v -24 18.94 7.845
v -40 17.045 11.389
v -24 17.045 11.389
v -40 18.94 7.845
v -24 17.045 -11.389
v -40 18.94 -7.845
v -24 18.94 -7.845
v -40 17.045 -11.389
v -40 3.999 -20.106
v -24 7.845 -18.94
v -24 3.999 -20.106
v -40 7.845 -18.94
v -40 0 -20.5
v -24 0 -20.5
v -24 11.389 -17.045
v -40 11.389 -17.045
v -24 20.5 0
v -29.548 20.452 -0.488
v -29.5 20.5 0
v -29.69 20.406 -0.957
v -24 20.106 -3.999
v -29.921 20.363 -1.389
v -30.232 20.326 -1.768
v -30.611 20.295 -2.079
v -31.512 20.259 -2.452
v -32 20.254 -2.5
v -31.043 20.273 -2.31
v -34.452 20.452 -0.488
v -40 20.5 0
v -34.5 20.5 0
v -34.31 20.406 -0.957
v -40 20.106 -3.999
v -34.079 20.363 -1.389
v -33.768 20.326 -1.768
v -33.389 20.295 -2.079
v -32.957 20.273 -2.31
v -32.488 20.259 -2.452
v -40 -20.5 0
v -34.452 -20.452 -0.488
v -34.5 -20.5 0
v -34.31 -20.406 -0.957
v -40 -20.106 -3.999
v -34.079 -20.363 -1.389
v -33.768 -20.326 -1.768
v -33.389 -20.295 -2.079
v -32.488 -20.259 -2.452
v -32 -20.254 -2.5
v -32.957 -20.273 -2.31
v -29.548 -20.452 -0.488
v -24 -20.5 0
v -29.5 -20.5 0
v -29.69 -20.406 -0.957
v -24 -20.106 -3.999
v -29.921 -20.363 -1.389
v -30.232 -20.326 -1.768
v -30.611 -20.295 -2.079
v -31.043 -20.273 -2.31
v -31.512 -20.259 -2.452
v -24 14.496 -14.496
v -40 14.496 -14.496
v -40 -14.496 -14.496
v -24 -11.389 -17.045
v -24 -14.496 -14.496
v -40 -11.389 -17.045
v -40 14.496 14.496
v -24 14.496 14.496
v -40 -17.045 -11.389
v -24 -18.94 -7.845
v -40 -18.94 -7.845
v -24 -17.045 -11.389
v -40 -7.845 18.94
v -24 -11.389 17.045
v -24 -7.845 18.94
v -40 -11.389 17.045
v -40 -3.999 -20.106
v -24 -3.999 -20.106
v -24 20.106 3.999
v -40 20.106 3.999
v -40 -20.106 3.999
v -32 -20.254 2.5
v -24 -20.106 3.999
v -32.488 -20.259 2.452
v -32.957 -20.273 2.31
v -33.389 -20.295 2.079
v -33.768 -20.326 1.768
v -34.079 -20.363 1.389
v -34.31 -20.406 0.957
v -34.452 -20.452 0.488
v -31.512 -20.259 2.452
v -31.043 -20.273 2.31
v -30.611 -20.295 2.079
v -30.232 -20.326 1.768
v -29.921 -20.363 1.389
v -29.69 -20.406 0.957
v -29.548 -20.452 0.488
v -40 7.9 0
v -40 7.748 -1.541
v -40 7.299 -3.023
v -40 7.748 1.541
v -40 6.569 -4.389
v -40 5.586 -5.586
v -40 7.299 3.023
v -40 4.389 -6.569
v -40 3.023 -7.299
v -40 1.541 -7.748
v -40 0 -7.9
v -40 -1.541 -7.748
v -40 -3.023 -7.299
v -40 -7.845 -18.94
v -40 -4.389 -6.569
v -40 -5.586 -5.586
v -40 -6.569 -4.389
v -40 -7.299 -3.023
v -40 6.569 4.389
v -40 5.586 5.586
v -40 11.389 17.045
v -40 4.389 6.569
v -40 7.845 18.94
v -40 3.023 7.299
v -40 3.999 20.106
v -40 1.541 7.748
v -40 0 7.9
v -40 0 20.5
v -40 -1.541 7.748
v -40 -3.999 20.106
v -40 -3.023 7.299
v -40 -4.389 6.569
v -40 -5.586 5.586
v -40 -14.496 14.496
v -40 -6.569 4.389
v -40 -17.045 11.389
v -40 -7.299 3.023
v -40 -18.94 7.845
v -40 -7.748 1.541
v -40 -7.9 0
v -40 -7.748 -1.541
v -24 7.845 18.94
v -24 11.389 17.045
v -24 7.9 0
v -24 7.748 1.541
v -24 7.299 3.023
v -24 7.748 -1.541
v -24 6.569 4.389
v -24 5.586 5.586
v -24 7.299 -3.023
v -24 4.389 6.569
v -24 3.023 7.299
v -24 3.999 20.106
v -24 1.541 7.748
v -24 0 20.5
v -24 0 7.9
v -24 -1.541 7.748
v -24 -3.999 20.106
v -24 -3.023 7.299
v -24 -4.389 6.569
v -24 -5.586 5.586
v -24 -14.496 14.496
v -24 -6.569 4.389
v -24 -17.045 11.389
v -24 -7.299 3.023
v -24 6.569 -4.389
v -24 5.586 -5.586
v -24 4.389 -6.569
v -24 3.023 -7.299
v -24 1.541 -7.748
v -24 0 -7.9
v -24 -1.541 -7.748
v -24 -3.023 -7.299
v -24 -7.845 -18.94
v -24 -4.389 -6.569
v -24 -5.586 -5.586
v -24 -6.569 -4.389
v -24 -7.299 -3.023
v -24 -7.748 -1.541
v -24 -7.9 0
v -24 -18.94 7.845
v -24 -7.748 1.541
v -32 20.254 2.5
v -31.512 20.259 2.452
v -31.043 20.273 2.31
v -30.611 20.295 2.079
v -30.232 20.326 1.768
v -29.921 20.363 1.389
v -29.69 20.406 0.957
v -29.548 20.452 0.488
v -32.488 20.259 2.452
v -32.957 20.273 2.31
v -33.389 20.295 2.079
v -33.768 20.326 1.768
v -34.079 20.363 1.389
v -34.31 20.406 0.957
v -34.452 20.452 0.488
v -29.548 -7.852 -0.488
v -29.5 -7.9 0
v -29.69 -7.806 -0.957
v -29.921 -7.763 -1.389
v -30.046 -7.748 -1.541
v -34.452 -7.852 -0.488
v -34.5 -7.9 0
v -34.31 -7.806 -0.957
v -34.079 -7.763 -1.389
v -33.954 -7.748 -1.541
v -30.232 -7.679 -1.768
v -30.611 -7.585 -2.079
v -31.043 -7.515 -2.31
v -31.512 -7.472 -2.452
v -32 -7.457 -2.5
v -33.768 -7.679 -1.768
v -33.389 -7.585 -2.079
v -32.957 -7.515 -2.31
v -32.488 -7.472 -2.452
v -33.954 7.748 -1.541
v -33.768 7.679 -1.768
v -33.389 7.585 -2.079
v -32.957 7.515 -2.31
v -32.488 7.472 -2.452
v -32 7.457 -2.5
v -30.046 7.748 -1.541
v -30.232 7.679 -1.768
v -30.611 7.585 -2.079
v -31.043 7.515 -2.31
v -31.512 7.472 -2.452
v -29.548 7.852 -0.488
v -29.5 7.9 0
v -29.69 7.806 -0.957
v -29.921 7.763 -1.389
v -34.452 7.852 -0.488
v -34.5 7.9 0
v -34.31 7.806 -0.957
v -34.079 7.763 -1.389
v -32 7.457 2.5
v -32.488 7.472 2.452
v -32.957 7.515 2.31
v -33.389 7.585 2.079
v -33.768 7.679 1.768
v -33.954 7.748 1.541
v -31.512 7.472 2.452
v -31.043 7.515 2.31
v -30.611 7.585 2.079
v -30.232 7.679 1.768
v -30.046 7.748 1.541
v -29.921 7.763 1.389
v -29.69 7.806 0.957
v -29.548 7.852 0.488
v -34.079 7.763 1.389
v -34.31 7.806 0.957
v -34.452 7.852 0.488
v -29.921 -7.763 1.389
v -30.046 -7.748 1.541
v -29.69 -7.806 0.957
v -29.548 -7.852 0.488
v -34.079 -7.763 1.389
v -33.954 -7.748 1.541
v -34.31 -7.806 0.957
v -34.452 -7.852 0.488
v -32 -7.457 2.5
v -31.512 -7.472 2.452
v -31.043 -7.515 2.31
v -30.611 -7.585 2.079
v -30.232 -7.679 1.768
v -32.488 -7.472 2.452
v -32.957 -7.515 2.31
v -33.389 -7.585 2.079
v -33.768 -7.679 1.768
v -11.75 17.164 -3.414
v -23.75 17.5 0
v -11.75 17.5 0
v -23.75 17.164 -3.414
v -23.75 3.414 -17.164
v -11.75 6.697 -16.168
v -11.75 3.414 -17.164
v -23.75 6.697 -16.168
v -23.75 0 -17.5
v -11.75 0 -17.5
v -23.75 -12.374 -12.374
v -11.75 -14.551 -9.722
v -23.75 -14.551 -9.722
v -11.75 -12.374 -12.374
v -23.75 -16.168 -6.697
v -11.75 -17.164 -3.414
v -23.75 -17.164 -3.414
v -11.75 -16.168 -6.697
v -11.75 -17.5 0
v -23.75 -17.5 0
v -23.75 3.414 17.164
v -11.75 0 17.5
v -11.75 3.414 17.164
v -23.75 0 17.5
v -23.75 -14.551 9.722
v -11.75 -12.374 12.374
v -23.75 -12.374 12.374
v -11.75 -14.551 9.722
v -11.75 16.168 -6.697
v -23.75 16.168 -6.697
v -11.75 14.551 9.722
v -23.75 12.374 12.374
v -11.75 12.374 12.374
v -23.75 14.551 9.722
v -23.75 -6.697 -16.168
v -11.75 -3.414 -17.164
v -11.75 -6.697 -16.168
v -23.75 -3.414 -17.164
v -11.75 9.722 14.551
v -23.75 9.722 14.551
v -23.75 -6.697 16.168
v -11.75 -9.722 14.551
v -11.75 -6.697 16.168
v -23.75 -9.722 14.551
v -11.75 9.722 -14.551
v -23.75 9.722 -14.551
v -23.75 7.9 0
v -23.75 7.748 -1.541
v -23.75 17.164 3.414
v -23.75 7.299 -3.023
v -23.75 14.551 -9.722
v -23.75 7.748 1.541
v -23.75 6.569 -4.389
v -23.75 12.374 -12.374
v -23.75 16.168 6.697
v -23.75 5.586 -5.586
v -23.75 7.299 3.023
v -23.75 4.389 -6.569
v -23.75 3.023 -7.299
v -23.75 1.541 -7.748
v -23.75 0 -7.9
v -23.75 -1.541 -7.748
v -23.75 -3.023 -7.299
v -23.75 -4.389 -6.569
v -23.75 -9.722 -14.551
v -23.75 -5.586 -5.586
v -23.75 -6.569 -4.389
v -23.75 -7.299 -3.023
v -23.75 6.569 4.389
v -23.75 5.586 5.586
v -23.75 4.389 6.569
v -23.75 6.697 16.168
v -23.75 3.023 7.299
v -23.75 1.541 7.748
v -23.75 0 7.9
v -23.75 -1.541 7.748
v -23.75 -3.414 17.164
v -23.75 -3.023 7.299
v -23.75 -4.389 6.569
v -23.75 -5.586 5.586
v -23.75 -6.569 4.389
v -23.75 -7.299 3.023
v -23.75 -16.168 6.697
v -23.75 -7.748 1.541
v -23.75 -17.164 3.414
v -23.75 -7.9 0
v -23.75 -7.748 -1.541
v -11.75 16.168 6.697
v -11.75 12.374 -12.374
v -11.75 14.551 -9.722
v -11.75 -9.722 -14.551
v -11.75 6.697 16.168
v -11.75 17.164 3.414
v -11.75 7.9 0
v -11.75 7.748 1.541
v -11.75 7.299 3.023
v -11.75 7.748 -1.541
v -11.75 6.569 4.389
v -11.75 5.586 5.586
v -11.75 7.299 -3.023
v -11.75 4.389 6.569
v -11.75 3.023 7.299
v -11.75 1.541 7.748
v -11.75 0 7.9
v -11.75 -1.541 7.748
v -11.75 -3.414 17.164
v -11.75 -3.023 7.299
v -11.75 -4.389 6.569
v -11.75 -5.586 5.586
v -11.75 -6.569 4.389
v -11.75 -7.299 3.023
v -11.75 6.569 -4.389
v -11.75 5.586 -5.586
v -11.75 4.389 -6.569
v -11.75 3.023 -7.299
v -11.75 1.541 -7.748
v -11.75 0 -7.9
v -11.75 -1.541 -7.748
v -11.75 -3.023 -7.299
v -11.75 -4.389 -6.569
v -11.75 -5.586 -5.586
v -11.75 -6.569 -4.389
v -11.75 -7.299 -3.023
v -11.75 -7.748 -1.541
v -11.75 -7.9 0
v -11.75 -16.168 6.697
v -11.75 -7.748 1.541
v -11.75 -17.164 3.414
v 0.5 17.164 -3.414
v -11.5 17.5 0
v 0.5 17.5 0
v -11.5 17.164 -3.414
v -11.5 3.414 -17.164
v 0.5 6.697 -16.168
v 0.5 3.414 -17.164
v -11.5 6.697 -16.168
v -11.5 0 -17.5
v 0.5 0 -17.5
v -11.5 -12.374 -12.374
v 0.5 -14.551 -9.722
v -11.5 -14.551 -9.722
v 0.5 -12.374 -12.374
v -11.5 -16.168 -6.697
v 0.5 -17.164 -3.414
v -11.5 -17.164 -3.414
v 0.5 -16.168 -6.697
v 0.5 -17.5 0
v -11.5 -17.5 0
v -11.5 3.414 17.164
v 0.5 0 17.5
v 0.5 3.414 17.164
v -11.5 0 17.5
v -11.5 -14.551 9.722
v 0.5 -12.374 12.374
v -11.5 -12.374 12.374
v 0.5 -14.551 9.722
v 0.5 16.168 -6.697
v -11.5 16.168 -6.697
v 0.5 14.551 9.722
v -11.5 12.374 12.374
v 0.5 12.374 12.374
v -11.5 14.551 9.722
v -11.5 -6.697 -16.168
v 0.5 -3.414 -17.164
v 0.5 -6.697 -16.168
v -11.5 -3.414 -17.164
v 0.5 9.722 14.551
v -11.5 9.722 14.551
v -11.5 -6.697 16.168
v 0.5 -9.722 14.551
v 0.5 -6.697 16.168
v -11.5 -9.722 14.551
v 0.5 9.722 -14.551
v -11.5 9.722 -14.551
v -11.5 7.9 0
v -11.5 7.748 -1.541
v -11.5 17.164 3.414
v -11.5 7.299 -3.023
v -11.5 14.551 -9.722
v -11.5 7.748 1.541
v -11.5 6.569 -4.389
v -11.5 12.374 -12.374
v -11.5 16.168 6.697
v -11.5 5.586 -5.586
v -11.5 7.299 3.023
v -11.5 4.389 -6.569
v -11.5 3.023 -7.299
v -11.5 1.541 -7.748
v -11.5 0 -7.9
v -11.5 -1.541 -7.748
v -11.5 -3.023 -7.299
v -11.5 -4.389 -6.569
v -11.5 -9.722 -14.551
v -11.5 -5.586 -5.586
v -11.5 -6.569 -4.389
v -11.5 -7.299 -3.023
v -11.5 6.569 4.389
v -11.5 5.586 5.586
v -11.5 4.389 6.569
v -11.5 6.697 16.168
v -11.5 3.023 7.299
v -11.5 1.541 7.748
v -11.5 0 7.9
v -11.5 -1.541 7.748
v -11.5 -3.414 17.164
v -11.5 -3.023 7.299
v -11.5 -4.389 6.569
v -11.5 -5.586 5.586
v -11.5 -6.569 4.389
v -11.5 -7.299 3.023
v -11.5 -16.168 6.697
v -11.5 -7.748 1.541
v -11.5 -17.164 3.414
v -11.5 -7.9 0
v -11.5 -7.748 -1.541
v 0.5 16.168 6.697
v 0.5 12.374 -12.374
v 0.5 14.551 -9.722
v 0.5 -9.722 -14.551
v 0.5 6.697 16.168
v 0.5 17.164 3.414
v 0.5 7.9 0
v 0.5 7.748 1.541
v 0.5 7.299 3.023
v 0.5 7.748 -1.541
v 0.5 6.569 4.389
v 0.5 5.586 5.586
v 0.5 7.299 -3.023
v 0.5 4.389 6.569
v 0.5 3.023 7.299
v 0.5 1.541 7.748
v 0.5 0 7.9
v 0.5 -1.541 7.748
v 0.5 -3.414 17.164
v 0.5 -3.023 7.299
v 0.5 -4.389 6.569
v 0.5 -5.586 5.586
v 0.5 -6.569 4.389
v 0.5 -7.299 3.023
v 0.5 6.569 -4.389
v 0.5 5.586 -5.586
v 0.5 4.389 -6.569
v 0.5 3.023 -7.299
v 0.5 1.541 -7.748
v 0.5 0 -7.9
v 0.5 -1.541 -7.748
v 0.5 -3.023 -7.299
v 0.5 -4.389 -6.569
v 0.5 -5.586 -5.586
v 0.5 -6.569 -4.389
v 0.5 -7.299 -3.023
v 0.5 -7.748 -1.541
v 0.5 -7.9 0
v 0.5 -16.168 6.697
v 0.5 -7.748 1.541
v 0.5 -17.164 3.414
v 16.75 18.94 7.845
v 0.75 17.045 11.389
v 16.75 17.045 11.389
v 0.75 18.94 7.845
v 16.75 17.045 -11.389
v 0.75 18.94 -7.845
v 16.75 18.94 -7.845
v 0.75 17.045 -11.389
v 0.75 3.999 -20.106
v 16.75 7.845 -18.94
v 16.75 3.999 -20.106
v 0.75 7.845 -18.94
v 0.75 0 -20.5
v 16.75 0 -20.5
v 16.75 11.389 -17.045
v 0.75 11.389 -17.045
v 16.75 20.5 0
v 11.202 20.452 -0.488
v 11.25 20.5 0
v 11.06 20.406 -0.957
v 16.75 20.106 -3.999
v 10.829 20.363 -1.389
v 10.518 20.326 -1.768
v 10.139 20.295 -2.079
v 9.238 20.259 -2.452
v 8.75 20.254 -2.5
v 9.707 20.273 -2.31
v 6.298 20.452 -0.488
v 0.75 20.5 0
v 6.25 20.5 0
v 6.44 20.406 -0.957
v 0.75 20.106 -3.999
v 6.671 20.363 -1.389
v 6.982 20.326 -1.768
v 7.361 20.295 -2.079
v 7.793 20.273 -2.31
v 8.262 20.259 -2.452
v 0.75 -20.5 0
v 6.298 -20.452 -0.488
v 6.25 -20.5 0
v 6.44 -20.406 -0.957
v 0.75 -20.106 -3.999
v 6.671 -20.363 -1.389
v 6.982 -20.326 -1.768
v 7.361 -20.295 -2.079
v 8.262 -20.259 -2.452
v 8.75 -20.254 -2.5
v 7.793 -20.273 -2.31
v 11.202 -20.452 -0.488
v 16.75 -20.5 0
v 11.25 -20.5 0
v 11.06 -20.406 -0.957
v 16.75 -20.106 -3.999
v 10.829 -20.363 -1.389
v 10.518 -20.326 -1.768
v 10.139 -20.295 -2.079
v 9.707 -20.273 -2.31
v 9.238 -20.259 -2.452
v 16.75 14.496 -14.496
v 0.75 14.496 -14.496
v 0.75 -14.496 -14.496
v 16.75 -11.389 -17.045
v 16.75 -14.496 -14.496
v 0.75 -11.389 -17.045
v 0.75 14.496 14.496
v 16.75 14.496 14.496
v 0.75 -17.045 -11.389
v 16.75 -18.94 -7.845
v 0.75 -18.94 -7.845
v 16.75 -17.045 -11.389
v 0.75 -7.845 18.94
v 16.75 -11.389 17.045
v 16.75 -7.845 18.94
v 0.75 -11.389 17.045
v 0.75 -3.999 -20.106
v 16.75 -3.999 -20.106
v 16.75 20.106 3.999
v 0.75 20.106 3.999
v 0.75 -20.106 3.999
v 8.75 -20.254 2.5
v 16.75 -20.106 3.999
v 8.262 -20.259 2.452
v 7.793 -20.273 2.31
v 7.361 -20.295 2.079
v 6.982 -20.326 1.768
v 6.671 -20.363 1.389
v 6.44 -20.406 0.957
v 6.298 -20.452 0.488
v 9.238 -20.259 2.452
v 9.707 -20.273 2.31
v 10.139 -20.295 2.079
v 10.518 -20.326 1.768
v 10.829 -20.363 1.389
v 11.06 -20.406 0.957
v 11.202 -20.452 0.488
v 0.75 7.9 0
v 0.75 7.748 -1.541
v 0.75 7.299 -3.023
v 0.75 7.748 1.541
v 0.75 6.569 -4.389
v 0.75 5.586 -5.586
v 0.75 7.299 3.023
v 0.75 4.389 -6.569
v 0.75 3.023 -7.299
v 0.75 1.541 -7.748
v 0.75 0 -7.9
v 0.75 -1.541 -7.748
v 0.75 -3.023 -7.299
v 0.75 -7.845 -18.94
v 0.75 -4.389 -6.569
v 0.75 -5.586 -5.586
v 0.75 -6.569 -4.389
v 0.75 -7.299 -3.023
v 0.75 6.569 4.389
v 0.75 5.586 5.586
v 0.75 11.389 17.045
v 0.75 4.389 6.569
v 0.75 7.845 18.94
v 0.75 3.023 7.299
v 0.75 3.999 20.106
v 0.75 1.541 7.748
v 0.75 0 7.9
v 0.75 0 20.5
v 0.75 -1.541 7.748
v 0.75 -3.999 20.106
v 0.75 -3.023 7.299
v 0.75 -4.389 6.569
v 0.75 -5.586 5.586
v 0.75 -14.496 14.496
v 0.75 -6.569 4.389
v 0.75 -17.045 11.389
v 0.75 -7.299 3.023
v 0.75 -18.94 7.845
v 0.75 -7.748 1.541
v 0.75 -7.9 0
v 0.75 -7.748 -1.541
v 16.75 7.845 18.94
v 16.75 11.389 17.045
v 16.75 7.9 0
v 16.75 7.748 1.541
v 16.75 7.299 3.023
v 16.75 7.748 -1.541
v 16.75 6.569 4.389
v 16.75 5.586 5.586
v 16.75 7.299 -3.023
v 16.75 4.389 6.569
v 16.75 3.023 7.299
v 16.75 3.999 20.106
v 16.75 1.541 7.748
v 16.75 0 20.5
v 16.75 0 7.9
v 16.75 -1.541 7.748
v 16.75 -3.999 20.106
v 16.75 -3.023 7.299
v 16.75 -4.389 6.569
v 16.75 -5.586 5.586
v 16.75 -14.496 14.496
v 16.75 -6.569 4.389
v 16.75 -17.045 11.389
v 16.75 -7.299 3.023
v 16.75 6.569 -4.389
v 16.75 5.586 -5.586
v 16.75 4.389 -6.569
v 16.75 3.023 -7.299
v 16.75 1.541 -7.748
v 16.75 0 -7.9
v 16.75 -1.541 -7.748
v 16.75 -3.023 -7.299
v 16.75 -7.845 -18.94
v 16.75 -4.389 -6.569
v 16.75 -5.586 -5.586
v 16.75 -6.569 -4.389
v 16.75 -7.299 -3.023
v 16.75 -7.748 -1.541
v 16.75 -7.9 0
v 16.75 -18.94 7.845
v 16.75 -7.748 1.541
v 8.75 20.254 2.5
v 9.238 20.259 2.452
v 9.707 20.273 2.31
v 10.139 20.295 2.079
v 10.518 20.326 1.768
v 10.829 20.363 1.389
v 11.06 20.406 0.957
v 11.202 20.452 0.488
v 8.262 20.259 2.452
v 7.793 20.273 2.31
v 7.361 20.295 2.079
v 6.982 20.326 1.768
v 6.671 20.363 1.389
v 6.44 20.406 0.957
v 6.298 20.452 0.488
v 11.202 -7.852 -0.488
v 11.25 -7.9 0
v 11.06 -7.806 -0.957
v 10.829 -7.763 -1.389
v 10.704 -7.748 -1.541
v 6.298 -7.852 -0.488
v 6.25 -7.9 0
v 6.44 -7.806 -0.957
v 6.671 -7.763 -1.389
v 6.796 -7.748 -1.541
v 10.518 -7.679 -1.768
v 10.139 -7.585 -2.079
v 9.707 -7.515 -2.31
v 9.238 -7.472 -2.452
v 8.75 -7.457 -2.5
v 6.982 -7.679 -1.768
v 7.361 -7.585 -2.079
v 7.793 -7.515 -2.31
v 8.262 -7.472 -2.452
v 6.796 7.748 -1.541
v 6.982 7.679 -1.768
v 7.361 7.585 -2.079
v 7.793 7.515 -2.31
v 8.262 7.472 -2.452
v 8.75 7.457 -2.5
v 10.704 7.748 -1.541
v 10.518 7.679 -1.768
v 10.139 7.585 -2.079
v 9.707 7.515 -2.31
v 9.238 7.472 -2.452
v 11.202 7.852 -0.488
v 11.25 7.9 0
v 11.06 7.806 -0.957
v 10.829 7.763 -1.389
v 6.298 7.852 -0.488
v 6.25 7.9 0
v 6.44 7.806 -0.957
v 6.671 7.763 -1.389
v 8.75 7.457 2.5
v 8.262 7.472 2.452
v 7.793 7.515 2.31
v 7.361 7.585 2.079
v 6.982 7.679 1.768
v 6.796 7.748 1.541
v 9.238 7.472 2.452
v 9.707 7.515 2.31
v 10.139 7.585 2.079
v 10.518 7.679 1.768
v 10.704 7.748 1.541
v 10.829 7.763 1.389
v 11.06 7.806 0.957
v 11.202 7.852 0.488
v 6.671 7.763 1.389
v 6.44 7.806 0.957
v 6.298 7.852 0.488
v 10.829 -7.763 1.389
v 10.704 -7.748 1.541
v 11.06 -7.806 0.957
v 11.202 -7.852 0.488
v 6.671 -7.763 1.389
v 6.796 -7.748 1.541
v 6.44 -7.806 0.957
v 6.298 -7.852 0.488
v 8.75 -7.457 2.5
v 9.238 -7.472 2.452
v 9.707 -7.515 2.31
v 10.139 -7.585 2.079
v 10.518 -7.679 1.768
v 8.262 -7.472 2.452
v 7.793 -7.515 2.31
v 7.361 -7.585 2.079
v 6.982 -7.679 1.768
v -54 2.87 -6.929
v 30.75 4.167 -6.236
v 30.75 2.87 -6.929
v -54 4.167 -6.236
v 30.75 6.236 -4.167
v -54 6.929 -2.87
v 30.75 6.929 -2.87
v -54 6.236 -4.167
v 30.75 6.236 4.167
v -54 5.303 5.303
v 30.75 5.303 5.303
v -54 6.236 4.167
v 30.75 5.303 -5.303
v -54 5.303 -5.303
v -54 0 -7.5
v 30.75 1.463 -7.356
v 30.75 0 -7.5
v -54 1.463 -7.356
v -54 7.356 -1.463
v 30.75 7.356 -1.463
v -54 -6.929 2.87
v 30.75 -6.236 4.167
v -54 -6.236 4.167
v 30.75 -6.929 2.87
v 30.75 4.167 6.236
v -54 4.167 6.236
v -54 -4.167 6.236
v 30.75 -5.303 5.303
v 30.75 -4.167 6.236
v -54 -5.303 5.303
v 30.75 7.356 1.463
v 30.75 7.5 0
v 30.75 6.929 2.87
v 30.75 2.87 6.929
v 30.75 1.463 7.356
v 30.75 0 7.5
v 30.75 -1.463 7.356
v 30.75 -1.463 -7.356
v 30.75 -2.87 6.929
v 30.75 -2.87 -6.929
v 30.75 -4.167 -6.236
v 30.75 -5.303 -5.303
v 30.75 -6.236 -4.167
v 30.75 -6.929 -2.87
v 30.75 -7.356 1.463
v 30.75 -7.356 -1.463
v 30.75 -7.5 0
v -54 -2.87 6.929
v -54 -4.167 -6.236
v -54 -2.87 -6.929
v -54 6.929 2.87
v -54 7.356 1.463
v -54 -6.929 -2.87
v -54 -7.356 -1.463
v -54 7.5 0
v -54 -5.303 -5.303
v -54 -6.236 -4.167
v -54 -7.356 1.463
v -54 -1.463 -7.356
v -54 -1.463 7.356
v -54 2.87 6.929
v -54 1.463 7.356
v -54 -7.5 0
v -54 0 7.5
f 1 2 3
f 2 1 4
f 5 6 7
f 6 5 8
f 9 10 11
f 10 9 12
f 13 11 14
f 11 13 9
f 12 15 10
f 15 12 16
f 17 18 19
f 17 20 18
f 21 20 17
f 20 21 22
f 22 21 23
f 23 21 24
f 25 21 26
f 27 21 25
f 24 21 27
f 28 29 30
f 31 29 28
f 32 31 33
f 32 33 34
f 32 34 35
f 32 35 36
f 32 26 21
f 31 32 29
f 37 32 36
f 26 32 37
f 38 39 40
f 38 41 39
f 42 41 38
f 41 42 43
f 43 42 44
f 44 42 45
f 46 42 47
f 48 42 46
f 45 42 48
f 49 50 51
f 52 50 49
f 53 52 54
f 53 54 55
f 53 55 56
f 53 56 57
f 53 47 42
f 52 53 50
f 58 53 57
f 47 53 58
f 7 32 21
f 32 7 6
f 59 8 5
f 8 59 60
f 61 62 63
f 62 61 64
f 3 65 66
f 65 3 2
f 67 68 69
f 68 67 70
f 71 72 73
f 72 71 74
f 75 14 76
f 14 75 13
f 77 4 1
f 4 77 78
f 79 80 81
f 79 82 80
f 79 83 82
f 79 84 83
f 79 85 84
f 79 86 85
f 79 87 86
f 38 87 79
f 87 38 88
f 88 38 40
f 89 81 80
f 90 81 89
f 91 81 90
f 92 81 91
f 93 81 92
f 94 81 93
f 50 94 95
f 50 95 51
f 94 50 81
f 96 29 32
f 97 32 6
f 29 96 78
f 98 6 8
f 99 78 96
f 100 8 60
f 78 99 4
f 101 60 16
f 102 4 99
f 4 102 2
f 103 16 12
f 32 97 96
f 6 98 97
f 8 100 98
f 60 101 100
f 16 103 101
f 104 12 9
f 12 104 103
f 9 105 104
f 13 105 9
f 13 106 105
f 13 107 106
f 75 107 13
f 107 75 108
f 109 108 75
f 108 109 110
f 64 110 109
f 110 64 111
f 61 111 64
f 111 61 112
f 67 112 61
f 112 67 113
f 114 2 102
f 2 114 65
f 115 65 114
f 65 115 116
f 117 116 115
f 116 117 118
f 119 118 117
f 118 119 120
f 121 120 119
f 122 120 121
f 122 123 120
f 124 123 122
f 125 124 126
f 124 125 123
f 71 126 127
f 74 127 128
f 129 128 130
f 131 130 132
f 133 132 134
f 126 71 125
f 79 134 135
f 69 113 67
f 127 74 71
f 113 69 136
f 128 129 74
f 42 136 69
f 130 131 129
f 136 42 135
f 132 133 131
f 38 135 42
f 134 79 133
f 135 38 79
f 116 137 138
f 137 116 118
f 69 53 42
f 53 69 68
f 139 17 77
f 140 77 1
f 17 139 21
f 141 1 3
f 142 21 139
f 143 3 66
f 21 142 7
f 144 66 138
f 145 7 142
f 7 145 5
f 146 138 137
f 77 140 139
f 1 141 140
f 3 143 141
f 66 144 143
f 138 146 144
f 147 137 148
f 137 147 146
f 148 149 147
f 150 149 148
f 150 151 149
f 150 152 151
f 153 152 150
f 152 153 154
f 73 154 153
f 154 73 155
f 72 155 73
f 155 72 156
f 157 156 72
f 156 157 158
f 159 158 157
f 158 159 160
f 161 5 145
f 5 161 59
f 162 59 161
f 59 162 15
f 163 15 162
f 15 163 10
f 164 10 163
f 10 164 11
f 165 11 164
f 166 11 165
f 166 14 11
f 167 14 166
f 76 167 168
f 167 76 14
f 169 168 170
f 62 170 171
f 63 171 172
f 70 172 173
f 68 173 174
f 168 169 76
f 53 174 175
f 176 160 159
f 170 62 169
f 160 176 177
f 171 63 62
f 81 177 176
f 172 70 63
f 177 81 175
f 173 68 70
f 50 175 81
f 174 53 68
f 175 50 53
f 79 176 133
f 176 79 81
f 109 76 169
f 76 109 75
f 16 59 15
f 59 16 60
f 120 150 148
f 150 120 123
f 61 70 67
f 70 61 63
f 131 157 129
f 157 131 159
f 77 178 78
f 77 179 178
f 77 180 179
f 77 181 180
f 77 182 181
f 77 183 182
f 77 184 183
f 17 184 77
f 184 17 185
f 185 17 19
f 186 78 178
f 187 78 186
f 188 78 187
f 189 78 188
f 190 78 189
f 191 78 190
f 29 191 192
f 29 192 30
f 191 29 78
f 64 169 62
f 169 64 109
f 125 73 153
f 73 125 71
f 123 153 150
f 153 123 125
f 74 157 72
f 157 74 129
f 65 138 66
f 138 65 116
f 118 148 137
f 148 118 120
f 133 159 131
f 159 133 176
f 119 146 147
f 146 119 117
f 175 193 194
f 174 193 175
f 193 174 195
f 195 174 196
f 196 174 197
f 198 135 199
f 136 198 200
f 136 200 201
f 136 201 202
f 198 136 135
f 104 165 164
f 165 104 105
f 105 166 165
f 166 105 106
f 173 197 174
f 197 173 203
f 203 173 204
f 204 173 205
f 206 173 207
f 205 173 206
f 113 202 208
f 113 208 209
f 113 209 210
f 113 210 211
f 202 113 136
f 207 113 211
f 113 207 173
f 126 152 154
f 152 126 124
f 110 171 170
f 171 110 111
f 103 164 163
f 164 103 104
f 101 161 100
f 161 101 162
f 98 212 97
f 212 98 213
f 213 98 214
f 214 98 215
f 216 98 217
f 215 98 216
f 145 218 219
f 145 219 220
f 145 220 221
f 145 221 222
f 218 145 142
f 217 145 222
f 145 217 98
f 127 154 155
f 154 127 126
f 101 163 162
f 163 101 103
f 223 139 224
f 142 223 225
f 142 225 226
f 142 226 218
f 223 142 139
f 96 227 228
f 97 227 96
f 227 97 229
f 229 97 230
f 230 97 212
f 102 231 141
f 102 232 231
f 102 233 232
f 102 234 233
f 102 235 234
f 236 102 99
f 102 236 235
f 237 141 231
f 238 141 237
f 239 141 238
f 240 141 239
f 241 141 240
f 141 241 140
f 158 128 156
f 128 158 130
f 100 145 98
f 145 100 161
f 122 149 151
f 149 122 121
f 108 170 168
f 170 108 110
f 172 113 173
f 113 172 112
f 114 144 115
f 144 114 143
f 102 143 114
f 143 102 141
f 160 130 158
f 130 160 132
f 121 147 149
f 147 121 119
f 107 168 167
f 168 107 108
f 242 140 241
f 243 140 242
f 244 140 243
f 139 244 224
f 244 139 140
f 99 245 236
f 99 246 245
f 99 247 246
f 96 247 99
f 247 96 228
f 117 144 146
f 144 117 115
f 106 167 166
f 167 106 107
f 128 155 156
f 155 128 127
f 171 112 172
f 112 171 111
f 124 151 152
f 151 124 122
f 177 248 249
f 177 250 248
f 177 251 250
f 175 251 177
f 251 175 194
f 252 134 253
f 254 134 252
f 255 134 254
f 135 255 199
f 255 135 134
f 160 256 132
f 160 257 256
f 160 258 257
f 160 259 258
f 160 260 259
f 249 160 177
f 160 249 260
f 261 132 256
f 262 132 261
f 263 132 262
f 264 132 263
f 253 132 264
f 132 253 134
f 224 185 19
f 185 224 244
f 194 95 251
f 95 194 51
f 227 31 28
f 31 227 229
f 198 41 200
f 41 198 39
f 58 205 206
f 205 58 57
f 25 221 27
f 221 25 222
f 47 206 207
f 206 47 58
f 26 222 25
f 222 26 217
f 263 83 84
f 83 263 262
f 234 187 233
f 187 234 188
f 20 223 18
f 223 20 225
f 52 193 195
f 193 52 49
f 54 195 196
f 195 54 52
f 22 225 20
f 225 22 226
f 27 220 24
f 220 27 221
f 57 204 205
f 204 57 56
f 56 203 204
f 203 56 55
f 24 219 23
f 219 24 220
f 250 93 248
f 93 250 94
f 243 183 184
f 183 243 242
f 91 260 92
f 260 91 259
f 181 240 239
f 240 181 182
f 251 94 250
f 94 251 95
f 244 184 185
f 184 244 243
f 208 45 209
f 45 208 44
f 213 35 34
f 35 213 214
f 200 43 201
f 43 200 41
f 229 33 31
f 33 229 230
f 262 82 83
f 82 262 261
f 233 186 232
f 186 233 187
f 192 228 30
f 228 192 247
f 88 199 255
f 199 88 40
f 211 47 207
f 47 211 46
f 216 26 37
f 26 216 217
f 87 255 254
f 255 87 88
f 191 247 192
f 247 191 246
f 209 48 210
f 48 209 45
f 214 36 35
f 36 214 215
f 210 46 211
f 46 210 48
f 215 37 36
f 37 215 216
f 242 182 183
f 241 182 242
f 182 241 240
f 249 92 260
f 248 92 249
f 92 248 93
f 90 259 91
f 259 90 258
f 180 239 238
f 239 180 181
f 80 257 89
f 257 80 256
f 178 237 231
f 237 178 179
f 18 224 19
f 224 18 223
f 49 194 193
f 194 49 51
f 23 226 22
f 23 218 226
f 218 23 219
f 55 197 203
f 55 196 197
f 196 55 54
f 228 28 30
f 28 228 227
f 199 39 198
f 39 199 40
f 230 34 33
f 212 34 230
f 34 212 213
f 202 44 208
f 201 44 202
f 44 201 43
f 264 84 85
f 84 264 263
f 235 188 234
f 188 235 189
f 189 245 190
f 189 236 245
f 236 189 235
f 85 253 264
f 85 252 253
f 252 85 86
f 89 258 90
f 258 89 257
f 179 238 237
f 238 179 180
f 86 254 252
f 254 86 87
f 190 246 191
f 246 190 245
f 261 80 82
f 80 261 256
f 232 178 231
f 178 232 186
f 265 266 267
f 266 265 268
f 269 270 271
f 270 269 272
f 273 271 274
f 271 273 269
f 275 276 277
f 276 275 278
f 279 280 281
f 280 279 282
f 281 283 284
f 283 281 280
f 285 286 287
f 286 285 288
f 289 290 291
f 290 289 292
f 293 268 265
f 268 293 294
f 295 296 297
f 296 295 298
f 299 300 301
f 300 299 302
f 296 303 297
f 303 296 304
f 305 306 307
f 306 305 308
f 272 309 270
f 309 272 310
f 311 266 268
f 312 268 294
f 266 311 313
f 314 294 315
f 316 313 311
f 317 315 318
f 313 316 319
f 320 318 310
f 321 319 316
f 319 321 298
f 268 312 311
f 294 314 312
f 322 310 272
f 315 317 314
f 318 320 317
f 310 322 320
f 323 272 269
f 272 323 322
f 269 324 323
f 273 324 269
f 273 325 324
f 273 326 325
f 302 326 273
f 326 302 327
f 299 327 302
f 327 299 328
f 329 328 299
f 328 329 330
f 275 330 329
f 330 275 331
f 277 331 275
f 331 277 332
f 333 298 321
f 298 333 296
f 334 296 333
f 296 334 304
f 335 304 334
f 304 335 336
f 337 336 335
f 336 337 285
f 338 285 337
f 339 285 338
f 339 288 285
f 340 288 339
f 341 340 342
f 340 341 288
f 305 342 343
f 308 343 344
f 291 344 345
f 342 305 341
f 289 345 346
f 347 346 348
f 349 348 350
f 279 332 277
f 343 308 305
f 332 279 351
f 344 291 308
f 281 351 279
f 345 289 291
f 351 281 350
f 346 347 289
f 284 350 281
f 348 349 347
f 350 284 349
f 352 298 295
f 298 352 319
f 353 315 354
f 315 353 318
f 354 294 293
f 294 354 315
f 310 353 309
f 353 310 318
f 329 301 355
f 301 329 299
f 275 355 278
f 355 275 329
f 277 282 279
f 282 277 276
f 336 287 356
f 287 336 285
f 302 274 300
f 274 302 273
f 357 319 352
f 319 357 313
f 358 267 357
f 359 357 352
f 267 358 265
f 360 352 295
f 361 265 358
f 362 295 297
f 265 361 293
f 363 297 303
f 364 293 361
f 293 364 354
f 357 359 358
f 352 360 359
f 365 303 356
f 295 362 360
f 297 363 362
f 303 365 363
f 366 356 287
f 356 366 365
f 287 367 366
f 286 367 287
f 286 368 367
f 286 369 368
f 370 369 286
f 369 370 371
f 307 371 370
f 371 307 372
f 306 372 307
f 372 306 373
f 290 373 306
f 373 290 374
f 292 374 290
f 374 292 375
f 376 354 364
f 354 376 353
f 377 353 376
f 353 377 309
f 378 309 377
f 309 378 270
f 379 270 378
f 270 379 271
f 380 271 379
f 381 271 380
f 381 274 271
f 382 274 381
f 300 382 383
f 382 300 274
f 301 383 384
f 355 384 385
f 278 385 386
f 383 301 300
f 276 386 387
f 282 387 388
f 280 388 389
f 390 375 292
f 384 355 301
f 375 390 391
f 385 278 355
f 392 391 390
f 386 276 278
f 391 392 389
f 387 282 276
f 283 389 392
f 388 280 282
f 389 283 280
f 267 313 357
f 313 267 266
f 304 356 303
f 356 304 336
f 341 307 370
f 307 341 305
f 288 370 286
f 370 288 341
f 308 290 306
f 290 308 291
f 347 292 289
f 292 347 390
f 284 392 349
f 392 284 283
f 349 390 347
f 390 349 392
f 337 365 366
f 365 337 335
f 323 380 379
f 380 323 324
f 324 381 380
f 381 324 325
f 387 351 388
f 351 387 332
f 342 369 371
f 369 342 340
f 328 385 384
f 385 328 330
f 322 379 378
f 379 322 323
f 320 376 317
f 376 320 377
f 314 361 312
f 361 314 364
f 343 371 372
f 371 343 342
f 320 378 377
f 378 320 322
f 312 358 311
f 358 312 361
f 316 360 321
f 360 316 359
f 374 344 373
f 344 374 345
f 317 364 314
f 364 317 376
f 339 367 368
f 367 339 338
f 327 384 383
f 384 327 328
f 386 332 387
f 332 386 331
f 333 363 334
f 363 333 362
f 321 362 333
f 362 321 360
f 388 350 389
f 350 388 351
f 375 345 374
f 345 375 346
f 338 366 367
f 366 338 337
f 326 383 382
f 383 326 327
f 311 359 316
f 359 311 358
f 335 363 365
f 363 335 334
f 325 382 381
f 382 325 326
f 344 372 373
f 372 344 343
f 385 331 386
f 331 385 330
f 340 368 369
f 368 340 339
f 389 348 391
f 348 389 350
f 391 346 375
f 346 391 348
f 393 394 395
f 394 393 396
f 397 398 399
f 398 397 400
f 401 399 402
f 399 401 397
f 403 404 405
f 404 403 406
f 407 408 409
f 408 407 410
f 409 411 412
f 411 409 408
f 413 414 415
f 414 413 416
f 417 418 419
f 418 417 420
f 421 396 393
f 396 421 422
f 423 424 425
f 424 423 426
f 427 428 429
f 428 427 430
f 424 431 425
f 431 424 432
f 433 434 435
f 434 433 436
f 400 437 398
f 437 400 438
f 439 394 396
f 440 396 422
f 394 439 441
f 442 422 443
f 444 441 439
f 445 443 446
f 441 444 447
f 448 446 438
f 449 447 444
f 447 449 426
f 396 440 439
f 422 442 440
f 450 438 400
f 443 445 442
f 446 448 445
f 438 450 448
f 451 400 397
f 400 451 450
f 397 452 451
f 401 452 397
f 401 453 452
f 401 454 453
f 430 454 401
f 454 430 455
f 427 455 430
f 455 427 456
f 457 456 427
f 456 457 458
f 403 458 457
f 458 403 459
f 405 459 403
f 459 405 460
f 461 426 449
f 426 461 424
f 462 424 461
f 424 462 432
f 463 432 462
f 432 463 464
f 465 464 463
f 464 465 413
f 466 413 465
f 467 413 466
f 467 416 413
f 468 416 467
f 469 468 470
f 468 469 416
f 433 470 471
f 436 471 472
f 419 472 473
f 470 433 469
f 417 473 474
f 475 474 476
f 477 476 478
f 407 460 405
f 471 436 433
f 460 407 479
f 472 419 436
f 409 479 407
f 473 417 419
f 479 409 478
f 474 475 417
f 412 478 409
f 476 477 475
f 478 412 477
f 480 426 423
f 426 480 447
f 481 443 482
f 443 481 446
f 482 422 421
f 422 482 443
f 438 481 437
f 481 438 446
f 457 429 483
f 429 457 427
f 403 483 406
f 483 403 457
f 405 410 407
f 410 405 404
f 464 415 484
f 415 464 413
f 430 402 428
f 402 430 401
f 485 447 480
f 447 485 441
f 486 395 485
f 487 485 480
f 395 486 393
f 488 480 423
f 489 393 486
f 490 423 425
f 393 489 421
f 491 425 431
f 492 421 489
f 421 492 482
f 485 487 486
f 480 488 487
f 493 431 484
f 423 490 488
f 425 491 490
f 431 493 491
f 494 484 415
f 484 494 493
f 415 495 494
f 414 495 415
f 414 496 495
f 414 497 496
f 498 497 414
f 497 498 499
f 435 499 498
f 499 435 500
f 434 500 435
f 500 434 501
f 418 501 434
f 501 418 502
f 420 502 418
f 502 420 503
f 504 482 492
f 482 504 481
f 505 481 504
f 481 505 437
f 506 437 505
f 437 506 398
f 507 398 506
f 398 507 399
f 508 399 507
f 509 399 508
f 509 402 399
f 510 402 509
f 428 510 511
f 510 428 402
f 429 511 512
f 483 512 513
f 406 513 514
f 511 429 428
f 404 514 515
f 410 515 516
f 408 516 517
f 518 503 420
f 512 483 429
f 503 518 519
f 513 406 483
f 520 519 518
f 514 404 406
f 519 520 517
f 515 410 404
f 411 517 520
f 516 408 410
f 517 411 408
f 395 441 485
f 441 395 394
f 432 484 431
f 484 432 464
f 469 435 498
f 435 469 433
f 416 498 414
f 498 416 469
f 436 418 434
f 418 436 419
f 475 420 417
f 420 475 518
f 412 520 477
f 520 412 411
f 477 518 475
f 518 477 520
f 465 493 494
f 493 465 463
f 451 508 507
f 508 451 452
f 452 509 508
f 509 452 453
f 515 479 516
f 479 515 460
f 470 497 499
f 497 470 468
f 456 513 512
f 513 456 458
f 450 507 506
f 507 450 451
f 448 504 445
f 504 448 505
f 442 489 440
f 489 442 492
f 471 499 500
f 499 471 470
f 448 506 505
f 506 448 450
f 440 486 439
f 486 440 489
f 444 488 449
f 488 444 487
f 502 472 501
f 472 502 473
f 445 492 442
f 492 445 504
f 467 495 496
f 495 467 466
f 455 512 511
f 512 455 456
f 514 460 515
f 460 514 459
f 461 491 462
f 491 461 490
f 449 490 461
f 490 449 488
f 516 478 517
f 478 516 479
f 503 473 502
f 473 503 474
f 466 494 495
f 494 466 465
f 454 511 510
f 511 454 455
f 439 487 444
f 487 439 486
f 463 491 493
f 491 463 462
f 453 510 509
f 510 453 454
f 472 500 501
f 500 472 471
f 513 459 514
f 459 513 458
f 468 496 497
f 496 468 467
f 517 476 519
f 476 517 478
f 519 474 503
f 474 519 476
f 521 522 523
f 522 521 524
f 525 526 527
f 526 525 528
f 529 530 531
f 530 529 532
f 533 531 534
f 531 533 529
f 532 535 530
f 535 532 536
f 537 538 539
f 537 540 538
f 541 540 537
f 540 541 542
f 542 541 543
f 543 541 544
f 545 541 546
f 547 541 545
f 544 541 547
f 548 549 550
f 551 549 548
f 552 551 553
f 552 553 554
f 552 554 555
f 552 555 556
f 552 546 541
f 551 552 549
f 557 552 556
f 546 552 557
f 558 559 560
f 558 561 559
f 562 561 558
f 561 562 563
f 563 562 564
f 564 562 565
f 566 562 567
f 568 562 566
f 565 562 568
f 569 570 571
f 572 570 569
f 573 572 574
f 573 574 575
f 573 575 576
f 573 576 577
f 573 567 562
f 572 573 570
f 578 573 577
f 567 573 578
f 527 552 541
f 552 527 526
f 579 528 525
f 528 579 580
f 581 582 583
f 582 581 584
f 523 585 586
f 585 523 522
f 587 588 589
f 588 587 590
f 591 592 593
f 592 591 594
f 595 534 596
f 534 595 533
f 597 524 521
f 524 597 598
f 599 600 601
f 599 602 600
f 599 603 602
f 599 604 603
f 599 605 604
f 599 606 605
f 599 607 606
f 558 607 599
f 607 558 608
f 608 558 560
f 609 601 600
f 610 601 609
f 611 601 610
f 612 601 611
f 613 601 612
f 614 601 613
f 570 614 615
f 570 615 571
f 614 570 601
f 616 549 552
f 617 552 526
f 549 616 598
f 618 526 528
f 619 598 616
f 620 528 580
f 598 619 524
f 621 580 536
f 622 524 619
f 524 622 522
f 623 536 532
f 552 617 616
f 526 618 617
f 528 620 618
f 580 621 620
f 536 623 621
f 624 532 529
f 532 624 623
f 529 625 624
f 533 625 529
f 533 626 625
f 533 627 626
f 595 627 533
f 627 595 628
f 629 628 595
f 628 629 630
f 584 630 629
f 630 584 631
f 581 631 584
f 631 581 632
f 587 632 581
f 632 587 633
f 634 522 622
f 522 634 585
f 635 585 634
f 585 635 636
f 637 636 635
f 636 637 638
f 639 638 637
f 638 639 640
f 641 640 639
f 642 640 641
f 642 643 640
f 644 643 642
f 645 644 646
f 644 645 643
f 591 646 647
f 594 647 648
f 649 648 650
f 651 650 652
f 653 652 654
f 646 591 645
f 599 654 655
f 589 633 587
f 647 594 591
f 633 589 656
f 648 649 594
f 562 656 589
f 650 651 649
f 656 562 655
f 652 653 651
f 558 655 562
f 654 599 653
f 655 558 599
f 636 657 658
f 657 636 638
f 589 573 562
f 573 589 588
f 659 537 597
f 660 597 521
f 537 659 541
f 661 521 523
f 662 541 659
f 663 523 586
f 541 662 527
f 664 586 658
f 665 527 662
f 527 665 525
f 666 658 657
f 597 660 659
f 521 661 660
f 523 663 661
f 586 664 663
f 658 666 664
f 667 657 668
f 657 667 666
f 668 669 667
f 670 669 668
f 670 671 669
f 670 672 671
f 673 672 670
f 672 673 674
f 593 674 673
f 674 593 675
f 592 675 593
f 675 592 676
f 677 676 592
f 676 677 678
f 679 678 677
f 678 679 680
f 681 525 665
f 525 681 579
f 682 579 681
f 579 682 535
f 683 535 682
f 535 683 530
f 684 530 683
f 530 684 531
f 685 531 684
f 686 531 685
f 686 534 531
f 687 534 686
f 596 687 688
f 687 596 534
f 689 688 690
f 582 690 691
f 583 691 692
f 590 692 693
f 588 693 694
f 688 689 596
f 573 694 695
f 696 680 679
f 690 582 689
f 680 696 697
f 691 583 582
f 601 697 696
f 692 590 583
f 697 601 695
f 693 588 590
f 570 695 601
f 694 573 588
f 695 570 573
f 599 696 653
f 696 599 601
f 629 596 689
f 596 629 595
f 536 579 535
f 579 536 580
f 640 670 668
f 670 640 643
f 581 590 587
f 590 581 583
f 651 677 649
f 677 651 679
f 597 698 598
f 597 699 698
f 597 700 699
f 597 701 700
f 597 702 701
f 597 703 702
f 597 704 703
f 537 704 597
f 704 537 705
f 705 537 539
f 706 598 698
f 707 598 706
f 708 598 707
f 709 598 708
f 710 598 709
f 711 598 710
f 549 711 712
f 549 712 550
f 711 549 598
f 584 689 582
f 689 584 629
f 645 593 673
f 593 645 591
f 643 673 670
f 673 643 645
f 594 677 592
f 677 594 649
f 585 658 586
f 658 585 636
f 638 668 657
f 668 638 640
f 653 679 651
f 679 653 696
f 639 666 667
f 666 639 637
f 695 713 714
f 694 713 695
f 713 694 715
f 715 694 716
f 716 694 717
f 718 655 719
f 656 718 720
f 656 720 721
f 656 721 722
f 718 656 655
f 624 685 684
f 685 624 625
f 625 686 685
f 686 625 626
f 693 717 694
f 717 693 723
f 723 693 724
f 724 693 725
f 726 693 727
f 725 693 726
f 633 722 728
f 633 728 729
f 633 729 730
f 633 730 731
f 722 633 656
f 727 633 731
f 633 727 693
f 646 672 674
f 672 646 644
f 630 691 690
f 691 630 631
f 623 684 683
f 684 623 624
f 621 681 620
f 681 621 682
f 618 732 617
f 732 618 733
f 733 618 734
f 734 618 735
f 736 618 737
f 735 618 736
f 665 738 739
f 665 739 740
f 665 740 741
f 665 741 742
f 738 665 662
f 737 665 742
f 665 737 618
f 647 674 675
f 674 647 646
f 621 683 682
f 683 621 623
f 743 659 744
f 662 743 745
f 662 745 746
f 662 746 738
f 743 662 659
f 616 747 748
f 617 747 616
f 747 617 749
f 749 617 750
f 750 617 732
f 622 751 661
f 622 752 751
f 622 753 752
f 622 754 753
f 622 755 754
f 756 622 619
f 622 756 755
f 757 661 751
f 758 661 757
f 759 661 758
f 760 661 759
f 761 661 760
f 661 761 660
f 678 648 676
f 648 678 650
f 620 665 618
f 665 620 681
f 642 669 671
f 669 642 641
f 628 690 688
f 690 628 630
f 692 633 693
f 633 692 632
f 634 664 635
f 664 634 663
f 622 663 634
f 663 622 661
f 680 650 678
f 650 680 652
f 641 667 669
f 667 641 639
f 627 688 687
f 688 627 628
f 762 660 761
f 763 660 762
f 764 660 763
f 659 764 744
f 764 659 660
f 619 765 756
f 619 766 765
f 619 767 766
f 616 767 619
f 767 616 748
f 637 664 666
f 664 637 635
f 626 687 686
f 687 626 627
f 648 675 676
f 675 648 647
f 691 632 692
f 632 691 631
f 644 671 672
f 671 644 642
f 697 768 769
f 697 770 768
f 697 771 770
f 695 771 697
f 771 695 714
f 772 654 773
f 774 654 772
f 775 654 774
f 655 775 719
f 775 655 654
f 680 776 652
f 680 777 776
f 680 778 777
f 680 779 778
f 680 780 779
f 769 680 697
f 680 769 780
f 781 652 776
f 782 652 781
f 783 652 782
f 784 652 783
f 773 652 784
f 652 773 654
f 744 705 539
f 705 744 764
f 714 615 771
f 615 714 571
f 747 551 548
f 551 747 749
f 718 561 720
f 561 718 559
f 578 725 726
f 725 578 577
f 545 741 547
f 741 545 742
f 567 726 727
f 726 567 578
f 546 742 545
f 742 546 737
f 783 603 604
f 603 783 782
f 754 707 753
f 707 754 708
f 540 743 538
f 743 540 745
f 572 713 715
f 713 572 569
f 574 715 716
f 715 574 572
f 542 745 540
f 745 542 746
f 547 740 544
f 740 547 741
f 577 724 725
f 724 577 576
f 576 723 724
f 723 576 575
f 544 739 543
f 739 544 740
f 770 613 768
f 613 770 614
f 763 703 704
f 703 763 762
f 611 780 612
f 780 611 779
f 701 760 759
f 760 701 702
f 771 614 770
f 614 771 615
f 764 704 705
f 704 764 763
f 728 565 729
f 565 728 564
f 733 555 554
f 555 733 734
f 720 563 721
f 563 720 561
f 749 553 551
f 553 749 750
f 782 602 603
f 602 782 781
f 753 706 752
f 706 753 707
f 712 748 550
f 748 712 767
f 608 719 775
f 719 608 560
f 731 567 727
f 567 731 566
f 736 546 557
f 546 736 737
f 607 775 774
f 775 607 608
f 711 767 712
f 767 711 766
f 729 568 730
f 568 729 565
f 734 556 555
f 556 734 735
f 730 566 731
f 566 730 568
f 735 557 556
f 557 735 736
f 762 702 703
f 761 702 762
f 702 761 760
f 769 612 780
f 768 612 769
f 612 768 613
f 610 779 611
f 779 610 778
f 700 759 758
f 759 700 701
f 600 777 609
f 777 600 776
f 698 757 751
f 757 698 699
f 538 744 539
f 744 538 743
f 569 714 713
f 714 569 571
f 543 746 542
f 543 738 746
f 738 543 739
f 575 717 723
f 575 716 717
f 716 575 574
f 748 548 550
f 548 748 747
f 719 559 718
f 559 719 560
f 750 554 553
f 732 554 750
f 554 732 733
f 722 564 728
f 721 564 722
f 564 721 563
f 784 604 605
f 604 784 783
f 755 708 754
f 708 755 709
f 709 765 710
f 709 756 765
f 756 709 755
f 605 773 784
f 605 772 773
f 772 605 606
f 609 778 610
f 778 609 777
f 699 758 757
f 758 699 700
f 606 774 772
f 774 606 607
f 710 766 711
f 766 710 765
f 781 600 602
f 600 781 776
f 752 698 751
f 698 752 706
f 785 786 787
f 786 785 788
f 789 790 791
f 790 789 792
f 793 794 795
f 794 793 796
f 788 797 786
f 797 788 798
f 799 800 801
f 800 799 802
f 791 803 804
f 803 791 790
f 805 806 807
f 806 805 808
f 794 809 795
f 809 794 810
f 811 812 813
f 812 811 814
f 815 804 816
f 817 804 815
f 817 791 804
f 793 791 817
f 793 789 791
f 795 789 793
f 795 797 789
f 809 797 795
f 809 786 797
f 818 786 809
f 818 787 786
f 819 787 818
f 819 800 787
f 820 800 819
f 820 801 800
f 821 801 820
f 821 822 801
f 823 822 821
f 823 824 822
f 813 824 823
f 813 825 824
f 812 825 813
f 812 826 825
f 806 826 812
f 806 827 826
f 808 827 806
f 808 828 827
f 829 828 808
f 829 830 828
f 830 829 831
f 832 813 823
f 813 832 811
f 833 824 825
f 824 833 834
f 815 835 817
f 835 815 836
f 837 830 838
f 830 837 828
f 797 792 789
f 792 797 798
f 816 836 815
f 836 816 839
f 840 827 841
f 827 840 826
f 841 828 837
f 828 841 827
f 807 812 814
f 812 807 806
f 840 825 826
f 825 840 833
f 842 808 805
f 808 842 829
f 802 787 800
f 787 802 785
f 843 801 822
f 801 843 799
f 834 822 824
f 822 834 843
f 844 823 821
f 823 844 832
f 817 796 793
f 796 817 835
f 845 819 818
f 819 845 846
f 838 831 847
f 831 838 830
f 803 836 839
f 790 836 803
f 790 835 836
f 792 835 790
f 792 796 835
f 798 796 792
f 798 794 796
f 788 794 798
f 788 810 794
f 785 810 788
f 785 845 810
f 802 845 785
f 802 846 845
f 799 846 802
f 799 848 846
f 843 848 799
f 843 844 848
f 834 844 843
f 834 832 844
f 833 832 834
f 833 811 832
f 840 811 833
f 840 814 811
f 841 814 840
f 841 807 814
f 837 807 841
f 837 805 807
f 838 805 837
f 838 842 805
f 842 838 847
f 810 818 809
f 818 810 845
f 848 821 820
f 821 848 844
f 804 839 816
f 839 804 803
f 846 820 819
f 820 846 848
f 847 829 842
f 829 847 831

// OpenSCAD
$fn = 32;

// ------------------------------------------------------------------------
// Shaft with rings and collars: d15 shaft, 4 rings
// Every part is its own module, assembly() places them once.
// ------------------------------------------------------------------------

// --- part 1 ---
module shaft() {
  translate([0, 0, -42.375]) cylinder(h = 84.75, d = 15);
}

// --- part 2 ---
module collar_a() {
  difference() {
    cylinder(h = 16, d = 41);
    translate([0, 0, -1]) cylinder(h = 18, d = 15.8);
    translate([0, 0, 8]) rotate([90, 0, 0]) cylinder(h = 43, d = 5, center = true);
  }
}

// --- part 3 ---
module spacer_a() {
  difference() {
      translate([0, 0, 0]) cylinder(h = 12, d = 35);
      translate([0, 0, -1]) cylinder(h = 14, d = 15.8);
    }
}

// --- part 4 ---
module spacer_b() {
  difference() {
      translate([0, 0, 0]) cylinder(h = 12, d = 35);
      translate([0, 0, -1]) cylinder(h = 14, d = 15.8);
    }
}

// --- part 5 ---
module collar_b() {
  difference() {
    cylinder(h = 16, d = 41);
    translate([0, 0, -1]) cylinder(h = 18, d = 15.8);
    translate([0, 0, 8]) rotate([90, 0, 0]) cylinder(h = 43, d = 5, center = true);
  }
}

// --- assembly ---
module assembly() {
  translate([-11.625, 0, 0]) rotate([0, 90, 0]) shaft();
  translate([-40, 0, 0]) rotate([0, 90, 0]) collar_a();
  translate([-23.75, 0, 0]) rotate([0, 90, 0]) spacer_a();
  translate([-11.5, 0, 0]) rotate([0, 90, 0]) spacer_b();
  translate([0.75, 0, 0]) rotate([0, 90, 0]) collar_b();
}

assembly();
